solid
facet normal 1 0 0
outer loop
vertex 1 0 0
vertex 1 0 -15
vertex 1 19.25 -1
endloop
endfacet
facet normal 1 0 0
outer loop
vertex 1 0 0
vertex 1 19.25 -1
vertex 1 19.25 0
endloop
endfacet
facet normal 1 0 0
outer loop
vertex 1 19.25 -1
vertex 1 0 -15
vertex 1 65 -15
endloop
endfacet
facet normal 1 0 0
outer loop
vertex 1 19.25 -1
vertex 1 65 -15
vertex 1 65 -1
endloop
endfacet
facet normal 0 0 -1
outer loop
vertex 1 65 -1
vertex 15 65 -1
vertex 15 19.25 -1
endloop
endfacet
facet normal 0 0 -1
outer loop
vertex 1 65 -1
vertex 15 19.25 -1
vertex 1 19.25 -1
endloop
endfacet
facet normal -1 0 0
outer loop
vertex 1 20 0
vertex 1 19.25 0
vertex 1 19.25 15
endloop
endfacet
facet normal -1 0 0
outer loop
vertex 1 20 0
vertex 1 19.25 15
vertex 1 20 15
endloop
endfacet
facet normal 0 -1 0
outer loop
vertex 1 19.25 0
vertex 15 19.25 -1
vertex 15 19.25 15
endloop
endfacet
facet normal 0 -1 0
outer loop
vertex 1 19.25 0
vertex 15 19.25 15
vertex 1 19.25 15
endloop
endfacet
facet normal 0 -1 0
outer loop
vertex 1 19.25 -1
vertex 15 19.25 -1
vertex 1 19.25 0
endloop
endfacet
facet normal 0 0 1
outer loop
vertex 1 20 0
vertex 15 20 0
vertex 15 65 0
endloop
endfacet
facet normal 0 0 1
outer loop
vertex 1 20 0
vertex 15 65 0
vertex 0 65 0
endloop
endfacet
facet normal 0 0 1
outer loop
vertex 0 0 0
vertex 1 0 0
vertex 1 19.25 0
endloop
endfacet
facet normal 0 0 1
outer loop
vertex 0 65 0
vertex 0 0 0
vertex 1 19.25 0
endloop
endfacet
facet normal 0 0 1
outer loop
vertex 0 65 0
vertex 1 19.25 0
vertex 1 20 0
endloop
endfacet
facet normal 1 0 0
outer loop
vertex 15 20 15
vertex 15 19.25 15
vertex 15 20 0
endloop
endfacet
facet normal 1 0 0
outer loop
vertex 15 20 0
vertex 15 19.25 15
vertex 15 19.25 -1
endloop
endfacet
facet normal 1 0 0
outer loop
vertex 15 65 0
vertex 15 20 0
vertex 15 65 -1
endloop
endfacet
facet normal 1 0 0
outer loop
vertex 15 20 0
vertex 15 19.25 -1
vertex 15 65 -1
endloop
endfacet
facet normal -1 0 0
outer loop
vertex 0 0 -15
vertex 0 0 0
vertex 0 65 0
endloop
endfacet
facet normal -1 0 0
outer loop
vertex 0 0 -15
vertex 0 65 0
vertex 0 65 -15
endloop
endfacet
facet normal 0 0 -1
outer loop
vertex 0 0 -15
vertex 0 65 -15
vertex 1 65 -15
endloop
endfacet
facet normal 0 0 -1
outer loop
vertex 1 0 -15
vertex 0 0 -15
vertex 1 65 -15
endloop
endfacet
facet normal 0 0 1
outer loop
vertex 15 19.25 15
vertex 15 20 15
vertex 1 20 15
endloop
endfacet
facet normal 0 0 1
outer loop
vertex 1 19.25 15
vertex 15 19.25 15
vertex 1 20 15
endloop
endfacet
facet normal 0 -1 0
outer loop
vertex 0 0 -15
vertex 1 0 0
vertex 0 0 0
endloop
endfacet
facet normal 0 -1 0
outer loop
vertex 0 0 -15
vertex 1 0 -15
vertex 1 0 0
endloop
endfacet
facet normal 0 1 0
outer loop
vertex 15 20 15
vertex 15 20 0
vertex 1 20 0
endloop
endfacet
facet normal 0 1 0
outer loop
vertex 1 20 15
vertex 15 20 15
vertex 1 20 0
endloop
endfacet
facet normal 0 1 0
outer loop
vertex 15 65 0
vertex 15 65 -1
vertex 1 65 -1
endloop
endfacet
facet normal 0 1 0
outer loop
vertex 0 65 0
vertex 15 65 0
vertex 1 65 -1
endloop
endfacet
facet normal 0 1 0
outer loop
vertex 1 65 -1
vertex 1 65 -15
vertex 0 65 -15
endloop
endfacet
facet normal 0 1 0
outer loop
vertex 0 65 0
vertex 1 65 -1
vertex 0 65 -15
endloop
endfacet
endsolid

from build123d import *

# Parameters (mm, degrees)
EXTRUDE_1_DEPTH     = 65
CUT_EXTRUDE_START   = -20
SKETCH_6_W          = 14
SKETCH_6_H          = 1
CUT_EXTRUDE_2_DEPTH = 20
SKETCH_7_W          = 14
SKETCH_7_H          = 0.75
EXTRUDE_2_DEPTH     = 16


with BuildPart() as part:
    # Эскиз1 → Бобышка-Вытянуть1 (new body)
    with BuildSketch(Plane(origin=(0, 0, 0), x_dir=(1, 0, 0), z_dir=(0, 1, 0))):
        Polygon((0, 0), (0, 15), (1, 15), (1, 1), (15, 1), (15, 0), align=None)
    extrude(amount=EXTRUDE_1_DEPTH)

    # Эскиз6 → Вырез-Вытянуть2 (cut)
    with BuildSketch(Plane.XZ.offset(CUT_EXTRUDE_START)):
        with Locations((8, -0.5)):
            Rectangle(SKETCH_6_W, SKETCH_6_H)
    extrude(amount=CUT_EXTRUDE_2_DEPTH, mode=Mode.SUBTRACT)

    # Эскиз7 → Бобышка-Вытянуть2 (add)
    with BuildSketch(Plane(origin=(0, 0, -1), x_dir=(-1, 0, 0), z_dir=(0, 0, -1))):
        with Locations((-8, 19.625)):
            Rectangle(SKETCH_7_W, SKETCH_7_H)
    extrude(amount=-EXTRUDE_2_DEPTH)


solid = part.part
